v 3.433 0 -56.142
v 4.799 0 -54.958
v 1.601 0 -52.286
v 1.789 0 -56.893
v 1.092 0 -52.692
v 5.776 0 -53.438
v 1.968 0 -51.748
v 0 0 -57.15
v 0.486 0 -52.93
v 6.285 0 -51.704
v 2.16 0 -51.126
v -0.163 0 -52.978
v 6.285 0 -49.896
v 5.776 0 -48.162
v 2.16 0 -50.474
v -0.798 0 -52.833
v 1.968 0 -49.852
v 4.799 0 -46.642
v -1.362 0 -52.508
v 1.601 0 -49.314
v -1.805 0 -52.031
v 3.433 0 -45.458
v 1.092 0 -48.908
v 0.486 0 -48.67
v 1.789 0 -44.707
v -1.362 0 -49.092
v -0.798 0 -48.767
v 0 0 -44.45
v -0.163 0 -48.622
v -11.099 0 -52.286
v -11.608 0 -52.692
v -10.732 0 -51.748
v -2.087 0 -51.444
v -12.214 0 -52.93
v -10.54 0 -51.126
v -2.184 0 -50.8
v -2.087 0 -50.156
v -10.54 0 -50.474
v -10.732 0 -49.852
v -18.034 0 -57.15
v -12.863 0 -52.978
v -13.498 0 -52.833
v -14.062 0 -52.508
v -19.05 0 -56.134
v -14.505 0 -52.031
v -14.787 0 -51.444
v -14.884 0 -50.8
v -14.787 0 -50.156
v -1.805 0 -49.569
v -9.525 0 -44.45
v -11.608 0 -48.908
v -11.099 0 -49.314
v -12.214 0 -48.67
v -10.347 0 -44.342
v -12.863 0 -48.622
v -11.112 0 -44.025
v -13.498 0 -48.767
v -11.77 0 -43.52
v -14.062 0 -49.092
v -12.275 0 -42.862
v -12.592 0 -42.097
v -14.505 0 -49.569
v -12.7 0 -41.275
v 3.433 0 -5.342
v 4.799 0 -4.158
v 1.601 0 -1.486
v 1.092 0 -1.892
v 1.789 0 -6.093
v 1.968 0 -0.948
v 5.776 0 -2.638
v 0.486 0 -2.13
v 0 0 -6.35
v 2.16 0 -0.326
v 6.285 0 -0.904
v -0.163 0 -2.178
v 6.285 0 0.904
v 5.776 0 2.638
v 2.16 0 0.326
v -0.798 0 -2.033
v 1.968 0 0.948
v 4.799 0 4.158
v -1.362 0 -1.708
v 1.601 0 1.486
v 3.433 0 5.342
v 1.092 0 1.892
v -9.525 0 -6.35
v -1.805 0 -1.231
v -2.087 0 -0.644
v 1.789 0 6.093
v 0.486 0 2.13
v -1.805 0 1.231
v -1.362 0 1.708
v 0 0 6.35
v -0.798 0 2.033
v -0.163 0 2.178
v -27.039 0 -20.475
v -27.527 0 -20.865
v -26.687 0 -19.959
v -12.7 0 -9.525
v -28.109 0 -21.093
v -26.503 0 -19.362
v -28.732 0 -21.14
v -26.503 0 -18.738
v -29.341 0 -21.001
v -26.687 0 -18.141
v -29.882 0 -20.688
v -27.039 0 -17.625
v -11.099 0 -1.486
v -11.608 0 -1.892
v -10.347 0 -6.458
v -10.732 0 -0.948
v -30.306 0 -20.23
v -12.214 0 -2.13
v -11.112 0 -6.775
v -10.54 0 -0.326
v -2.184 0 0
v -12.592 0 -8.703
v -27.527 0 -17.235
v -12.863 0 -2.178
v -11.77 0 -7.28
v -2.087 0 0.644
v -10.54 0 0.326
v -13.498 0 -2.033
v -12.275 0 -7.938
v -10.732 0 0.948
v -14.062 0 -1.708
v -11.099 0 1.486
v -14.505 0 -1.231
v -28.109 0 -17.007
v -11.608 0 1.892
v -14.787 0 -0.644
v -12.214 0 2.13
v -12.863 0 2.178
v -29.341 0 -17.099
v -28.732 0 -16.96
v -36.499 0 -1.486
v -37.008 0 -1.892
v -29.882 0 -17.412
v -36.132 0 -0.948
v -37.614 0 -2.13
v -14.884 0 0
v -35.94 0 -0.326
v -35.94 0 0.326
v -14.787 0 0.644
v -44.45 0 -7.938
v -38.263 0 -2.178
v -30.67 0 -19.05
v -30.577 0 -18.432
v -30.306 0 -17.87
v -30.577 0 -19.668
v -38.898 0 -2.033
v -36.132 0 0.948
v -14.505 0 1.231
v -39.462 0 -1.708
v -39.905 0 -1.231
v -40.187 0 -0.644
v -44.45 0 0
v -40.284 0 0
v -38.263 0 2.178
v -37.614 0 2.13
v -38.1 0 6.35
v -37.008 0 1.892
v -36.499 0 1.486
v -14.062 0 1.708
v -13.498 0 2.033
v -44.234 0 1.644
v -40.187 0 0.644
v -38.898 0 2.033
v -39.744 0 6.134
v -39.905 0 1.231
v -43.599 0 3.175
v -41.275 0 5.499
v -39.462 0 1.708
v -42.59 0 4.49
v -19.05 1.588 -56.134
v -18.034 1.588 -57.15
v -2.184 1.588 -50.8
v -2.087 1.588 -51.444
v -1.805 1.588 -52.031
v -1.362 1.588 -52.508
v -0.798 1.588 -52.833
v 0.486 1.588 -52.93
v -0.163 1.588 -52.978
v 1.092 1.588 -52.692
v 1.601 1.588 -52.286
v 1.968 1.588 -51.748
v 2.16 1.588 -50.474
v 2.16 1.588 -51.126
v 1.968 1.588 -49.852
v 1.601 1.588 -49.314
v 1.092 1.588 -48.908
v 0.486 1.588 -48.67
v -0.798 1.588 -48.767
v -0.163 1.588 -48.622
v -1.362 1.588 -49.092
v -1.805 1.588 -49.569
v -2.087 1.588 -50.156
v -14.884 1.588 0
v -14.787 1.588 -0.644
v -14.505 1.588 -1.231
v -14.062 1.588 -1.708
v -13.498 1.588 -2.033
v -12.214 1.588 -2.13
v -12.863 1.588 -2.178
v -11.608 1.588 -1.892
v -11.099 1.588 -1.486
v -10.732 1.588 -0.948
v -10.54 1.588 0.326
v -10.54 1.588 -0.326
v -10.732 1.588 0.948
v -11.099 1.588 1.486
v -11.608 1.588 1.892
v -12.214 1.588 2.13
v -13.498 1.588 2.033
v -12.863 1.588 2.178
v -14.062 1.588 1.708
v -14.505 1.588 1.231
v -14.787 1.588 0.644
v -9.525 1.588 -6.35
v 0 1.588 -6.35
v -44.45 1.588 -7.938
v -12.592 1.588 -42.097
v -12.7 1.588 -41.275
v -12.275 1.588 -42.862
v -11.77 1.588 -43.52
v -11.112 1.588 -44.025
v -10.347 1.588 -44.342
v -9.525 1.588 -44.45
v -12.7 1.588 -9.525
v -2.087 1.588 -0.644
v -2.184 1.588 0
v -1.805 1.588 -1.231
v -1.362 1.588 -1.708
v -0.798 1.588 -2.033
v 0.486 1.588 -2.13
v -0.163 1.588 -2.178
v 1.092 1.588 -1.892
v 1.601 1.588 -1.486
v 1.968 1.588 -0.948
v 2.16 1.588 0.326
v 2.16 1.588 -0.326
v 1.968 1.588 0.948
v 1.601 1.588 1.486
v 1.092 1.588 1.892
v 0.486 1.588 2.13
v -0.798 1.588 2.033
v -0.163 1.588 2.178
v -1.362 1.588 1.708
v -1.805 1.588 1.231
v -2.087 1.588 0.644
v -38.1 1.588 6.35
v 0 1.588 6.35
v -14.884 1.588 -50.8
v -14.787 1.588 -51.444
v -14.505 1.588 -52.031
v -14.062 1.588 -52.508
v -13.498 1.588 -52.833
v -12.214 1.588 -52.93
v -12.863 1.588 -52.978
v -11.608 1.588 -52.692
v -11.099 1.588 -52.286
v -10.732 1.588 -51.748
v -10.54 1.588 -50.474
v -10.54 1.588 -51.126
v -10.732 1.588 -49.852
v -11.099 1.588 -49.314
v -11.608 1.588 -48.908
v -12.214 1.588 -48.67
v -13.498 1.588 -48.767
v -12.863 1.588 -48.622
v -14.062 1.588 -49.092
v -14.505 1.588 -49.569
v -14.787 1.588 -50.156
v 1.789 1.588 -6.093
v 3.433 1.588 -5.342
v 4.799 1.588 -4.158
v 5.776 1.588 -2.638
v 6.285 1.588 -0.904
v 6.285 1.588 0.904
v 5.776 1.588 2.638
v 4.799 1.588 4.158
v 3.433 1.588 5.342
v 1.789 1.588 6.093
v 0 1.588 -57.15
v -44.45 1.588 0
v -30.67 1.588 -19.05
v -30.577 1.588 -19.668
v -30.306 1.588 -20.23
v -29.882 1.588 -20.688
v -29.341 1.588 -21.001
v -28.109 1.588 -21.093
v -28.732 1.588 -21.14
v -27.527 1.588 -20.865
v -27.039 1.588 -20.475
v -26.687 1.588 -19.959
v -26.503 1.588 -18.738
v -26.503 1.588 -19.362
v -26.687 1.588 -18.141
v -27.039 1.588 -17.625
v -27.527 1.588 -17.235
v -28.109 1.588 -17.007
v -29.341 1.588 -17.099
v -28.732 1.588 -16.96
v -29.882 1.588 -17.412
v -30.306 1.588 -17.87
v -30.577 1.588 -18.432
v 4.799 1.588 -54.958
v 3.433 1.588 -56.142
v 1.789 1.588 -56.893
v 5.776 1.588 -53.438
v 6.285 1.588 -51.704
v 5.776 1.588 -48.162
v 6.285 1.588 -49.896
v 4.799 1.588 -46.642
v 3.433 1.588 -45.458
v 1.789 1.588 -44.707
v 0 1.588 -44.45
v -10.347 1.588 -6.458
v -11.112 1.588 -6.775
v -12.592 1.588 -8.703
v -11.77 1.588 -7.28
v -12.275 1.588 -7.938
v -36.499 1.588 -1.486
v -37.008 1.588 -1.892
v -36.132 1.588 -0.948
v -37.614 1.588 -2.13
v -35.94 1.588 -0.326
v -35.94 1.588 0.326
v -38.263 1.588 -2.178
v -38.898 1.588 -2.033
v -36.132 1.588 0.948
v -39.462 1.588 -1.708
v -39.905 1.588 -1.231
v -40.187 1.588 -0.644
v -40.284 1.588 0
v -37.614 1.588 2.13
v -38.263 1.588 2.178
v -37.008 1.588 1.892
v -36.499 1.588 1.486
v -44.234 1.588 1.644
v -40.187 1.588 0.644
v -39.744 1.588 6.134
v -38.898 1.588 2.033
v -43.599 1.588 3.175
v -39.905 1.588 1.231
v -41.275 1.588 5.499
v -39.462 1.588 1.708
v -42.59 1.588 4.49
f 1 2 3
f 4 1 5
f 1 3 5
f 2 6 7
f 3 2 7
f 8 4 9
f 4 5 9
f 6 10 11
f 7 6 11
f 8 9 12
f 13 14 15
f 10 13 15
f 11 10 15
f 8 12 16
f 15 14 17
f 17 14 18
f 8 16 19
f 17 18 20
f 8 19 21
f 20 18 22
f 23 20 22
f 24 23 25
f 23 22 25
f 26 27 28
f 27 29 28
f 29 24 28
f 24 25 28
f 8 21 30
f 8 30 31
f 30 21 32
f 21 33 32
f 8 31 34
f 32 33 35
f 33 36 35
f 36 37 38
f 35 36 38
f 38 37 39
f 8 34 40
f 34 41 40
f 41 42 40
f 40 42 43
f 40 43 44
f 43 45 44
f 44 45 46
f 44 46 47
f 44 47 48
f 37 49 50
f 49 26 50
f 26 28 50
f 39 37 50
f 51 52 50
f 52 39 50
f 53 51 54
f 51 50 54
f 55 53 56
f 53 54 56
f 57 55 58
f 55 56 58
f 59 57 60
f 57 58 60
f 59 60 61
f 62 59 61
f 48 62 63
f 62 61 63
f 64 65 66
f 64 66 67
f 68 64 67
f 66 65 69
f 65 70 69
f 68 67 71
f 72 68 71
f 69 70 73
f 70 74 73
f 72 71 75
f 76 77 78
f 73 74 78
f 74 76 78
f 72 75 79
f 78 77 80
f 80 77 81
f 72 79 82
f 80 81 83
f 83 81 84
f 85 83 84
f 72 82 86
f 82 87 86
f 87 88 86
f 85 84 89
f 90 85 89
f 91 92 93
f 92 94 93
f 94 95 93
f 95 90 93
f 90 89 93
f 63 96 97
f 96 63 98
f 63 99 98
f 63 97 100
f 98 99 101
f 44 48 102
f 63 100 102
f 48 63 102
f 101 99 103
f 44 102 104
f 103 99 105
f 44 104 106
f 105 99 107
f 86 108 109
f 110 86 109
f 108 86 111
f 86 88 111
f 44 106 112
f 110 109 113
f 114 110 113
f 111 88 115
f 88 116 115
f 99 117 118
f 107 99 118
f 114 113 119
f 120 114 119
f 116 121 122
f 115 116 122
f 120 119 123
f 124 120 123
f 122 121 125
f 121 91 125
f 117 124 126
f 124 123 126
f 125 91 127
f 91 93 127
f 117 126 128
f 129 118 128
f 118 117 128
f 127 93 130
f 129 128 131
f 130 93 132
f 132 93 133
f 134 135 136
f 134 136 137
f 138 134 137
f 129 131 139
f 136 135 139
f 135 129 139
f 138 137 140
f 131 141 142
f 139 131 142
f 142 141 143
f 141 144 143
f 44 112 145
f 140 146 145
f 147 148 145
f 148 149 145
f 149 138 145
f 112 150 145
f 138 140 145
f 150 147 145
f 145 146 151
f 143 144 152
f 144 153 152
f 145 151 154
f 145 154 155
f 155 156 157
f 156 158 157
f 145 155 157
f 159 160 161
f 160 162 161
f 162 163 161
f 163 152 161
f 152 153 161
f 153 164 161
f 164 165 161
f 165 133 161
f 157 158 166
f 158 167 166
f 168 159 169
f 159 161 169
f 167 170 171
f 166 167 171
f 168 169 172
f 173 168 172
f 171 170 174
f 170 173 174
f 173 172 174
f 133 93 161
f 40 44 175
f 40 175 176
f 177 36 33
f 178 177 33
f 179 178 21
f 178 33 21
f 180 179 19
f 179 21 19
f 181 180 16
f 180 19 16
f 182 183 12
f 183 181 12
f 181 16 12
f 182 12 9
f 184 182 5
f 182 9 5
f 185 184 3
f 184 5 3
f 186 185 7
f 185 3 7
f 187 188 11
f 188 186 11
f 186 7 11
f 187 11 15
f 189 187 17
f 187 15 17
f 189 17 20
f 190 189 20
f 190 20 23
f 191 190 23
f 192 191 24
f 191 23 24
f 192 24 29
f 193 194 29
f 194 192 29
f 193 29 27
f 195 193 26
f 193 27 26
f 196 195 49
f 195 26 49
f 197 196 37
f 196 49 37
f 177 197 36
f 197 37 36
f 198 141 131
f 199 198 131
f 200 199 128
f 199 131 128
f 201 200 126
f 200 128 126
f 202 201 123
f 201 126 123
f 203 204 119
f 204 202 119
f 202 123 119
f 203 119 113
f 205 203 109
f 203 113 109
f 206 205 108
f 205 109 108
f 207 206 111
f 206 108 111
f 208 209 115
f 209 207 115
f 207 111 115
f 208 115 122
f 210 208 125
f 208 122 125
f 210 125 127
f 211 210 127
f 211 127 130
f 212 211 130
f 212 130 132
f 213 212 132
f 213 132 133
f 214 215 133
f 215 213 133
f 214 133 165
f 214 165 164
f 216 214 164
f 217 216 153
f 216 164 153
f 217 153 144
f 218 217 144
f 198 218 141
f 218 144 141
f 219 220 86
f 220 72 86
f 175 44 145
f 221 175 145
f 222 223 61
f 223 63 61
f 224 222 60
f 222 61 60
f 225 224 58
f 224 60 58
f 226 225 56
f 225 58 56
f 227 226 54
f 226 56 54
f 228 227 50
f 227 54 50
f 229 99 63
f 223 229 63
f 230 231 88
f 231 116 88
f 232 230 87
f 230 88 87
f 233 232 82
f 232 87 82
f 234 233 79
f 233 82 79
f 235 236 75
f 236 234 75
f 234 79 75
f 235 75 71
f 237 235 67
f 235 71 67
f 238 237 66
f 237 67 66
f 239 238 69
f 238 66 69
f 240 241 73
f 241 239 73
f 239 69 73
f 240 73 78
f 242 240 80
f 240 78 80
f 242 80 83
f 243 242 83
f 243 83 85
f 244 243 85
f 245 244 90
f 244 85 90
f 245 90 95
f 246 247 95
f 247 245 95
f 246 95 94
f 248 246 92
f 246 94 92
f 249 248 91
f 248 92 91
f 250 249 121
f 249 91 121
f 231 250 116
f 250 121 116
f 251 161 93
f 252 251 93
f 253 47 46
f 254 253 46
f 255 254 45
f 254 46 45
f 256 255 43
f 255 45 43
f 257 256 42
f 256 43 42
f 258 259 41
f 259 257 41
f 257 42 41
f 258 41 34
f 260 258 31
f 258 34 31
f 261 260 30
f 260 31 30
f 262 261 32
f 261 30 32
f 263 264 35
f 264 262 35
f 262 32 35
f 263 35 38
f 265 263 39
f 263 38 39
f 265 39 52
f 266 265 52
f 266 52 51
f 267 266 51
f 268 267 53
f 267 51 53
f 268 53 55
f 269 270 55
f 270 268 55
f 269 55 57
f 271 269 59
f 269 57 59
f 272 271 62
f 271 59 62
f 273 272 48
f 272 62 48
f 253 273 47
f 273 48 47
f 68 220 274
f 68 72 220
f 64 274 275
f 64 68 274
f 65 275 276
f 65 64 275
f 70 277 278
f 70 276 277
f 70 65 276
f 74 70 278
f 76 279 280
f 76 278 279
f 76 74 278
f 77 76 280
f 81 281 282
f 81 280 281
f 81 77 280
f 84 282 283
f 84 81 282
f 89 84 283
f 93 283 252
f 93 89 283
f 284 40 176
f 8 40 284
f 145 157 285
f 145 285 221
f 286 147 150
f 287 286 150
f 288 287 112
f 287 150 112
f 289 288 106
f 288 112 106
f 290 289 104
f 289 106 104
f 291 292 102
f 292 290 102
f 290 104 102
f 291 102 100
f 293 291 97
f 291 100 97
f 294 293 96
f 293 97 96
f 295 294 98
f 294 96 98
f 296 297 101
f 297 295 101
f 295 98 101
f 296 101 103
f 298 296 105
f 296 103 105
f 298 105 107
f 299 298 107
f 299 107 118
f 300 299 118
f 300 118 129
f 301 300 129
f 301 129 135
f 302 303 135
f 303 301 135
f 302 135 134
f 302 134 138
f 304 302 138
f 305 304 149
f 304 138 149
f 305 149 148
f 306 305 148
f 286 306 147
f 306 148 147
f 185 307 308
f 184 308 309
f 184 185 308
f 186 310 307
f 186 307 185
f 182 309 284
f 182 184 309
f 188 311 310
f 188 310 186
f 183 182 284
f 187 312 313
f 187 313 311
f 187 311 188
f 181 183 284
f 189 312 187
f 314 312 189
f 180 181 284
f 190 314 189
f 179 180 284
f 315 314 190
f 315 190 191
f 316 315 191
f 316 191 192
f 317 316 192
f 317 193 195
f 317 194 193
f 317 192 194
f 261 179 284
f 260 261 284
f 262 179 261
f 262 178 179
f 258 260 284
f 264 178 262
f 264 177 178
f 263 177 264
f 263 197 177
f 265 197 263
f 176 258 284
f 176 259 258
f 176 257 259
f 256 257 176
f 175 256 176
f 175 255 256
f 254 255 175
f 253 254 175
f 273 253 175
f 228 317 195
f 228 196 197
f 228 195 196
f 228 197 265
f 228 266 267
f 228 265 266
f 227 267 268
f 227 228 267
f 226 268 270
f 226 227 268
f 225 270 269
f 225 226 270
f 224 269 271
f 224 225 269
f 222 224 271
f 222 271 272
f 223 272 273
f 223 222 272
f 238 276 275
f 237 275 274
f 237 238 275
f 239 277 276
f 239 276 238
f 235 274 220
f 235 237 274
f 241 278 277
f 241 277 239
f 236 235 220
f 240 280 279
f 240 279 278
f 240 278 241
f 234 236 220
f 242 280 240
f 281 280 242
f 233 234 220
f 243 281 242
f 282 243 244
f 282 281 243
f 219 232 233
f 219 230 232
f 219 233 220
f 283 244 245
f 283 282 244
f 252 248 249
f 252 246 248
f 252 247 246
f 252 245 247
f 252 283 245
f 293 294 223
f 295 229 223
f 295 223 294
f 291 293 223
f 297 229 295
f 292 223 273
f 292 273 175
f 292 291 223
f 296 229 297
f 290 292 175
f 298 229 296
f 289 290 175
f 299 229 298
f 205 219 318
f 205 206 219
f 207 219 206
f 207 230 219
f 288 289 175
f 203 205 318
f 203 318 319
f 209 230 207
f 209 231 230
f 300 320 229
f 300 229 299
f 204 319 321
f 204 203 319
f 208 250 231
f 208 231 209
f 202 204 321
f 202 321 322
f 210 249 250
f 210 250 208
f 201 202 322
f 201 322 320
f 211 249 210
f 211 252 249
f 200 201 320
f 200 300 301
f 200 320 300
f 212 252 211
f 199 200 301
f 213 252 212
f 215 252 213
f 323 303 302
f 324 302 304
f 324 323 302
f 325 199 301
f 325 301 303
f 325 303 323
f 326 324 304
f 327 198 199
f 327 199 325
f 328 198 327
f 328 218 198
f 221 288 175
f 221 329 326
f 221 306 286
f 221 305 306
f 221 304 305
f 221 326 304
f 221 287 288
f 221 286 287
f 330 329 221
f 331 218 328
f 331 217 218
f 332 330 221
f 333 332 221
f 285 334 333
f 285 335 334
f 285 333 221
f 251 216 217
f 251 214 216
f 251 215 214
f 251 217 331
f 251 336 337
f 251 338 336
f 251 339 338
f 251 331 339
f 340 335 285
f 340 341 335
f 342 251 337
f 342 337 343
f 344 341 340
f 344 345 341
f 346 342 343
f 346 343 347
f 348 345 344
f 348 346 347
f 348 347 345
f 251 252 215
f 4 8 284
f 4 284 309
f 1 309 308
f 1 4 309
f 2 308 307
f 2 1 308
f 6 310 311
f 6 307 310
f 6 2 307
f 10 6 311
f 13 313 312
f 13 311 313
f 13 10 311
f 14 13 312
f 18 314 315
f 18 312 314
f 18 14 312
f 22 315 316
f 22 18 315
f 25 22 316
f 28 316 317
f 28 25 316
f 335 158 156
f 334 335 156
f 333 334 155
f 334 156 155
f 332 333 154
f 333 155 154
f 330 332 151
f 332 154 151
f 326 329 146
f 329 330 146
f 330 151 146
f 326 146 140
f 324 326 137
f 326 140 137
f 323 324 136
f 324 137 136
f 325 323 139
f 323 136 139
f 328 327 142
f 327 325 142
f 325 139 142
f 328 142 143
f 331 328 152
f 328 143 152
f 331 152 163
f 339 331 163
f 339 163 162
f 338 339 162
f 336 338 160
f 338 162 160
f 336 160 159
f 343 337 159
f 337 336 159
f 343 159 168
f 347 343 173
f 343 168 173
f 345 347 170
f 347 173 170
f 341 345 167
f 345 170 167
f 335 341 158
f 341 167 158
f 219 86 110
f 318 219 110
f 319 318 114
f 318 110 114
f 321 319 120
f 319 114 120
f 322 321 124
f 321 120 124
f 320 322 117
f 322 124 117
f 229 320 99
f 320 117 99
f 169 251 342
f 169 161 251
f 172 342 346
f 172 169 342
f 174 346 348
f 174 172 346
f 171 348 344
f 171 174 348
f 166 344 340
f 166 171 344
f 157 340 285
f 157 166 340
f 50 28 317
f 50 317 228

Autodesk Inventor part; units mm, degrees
ref_plane "YZ Plane" through (0, 0, 0) normal (1, 0, 0) x (0, 1, 0)
ref_plane "XZ Plane" through (0, 0, 0) normal (0, 1, 0) x (-1, 0, 0)
ref_plane "XY Plane" through (0, 0, 0) normal (0, 0, 1) x (1, 0, 0)
sketch "main" plane through (0, 0, 0) normal (0, 0, 1) x (1, 0, 0)
  circle A0 centre (18.656, 25.5497) radius 2.1844
  circle A1 centre (-6.744, 25.5497) radius 2.1844
  line L0 (-6.744, 16.0247) -> (-6.744, -15.7253)
  line L1 (-0.394, -30.5843) -> (25.006, 17.6122)
  arc A2 (-6.744, 16.0247) -> (-9.919, 19.1997) centre (-9.919, 16.0247) ccw
  line L2 (-19.444, 19.1997) -> (-9.919, 19.1997)
  circle A3 centre (-19.444, 25.5497) radius 2.1844
  arc A4 (-19.444, 31.8997) -> (-19.444, 19.1997) centre (-19.444, 25.5497) ccw
  line L3 (25.006, 25.5497) -> (25.006, 17.6122)
  line L4 (18.656, 31.8997) -> (-19.444, 31.8997)
  arc A5 (25.006, 25.5497) -> (18.656, 31.8997) centre (18.656, 25.5497) ccw
  arc A6 (-9.919, -18.9003) -> (-6.744, -15.7253) centre (-9.919, -15.7253) ccw
  line L5 (-19.444, -18.9003) -> (-9.919, -18.9003)
  circle A7 centre (-6.744, -25.2503) radius 2.1844
  line L6 (-0.394, -30.5843) -> (-1.41, -31.6003)
  circle A8 centre (-19.444, -25.2503) radius 2.1844
  arc A9 (-19.444, -18.9003) -> (-19.444, -31.6003) centre (-19.444, -25.2503) ccw
  line L7 (-1.41, -31.6003) -> (-19.444, -31.6003)
  circle A10 centre (9.131, 6.4997) radius 2.0955
  point P0 (-4.4485, 2.2347)
  dimension "d0" = 3.175
  dimension "d3" = 4.191
sketch "Sketch1" plane through (0, 0, 0) normal (0, 1, 0) x (-1, 0, 0)
  circle A0 centre (38.1, 0) radius 2.1844
  circle A1 centre (12.7, 0) radius 2.1844
  line L0 (12.7, -9.525) -> (12.7, -41.275)
  line L1 (19.05, -56.134) -> (44.45, -7.9375)
  arc A2 (12.7, -9.525) -> (9.525, -6.35) centre (9.525, -9.525) ccw
  line L2 (0, -6.35) -> (9.525, -6.35)
  circle A3 centre (0, 0) radius 2.1844
  arc A4 (0, 6.35) -> (0, -6.35) centre (0, 0) ccw
  line L3 (44.45, 0) -> (44.45, -7.9375)
  line L4 (38.1, 6.35) -> (0, 6.35)
  arc A5 (44.45, 0) -> (38.1, 6.35) centre (38.1, 0) ccw
  arc A6 (9.525, -44.45) -> (12.7, -41.275) centre (9.525, -41.275) ccw
  line L5 (0, -44.45) -> (9.525, -44.45)
  circle A7 centre (12.7, -50.8) radius 2.1844
  line L6 (19.05, -56.134) -> (18.034, -57.15)
  circle A8 centre (0, -50.8) radius 2.1844
  arc A9 (0, -44.45) -> (0, -57.15) centre (0, -50.8) ccw
  line L7 (18.034, -57.15) -> (0, -57.15)
  circle A10 centre (28.575, -19.05) radius 2.0955
extrude "Extrusion1" add sketch "Sketch1" along normal blind 1.5875
properties part number "gusset" material "Acetal Resin, White"
